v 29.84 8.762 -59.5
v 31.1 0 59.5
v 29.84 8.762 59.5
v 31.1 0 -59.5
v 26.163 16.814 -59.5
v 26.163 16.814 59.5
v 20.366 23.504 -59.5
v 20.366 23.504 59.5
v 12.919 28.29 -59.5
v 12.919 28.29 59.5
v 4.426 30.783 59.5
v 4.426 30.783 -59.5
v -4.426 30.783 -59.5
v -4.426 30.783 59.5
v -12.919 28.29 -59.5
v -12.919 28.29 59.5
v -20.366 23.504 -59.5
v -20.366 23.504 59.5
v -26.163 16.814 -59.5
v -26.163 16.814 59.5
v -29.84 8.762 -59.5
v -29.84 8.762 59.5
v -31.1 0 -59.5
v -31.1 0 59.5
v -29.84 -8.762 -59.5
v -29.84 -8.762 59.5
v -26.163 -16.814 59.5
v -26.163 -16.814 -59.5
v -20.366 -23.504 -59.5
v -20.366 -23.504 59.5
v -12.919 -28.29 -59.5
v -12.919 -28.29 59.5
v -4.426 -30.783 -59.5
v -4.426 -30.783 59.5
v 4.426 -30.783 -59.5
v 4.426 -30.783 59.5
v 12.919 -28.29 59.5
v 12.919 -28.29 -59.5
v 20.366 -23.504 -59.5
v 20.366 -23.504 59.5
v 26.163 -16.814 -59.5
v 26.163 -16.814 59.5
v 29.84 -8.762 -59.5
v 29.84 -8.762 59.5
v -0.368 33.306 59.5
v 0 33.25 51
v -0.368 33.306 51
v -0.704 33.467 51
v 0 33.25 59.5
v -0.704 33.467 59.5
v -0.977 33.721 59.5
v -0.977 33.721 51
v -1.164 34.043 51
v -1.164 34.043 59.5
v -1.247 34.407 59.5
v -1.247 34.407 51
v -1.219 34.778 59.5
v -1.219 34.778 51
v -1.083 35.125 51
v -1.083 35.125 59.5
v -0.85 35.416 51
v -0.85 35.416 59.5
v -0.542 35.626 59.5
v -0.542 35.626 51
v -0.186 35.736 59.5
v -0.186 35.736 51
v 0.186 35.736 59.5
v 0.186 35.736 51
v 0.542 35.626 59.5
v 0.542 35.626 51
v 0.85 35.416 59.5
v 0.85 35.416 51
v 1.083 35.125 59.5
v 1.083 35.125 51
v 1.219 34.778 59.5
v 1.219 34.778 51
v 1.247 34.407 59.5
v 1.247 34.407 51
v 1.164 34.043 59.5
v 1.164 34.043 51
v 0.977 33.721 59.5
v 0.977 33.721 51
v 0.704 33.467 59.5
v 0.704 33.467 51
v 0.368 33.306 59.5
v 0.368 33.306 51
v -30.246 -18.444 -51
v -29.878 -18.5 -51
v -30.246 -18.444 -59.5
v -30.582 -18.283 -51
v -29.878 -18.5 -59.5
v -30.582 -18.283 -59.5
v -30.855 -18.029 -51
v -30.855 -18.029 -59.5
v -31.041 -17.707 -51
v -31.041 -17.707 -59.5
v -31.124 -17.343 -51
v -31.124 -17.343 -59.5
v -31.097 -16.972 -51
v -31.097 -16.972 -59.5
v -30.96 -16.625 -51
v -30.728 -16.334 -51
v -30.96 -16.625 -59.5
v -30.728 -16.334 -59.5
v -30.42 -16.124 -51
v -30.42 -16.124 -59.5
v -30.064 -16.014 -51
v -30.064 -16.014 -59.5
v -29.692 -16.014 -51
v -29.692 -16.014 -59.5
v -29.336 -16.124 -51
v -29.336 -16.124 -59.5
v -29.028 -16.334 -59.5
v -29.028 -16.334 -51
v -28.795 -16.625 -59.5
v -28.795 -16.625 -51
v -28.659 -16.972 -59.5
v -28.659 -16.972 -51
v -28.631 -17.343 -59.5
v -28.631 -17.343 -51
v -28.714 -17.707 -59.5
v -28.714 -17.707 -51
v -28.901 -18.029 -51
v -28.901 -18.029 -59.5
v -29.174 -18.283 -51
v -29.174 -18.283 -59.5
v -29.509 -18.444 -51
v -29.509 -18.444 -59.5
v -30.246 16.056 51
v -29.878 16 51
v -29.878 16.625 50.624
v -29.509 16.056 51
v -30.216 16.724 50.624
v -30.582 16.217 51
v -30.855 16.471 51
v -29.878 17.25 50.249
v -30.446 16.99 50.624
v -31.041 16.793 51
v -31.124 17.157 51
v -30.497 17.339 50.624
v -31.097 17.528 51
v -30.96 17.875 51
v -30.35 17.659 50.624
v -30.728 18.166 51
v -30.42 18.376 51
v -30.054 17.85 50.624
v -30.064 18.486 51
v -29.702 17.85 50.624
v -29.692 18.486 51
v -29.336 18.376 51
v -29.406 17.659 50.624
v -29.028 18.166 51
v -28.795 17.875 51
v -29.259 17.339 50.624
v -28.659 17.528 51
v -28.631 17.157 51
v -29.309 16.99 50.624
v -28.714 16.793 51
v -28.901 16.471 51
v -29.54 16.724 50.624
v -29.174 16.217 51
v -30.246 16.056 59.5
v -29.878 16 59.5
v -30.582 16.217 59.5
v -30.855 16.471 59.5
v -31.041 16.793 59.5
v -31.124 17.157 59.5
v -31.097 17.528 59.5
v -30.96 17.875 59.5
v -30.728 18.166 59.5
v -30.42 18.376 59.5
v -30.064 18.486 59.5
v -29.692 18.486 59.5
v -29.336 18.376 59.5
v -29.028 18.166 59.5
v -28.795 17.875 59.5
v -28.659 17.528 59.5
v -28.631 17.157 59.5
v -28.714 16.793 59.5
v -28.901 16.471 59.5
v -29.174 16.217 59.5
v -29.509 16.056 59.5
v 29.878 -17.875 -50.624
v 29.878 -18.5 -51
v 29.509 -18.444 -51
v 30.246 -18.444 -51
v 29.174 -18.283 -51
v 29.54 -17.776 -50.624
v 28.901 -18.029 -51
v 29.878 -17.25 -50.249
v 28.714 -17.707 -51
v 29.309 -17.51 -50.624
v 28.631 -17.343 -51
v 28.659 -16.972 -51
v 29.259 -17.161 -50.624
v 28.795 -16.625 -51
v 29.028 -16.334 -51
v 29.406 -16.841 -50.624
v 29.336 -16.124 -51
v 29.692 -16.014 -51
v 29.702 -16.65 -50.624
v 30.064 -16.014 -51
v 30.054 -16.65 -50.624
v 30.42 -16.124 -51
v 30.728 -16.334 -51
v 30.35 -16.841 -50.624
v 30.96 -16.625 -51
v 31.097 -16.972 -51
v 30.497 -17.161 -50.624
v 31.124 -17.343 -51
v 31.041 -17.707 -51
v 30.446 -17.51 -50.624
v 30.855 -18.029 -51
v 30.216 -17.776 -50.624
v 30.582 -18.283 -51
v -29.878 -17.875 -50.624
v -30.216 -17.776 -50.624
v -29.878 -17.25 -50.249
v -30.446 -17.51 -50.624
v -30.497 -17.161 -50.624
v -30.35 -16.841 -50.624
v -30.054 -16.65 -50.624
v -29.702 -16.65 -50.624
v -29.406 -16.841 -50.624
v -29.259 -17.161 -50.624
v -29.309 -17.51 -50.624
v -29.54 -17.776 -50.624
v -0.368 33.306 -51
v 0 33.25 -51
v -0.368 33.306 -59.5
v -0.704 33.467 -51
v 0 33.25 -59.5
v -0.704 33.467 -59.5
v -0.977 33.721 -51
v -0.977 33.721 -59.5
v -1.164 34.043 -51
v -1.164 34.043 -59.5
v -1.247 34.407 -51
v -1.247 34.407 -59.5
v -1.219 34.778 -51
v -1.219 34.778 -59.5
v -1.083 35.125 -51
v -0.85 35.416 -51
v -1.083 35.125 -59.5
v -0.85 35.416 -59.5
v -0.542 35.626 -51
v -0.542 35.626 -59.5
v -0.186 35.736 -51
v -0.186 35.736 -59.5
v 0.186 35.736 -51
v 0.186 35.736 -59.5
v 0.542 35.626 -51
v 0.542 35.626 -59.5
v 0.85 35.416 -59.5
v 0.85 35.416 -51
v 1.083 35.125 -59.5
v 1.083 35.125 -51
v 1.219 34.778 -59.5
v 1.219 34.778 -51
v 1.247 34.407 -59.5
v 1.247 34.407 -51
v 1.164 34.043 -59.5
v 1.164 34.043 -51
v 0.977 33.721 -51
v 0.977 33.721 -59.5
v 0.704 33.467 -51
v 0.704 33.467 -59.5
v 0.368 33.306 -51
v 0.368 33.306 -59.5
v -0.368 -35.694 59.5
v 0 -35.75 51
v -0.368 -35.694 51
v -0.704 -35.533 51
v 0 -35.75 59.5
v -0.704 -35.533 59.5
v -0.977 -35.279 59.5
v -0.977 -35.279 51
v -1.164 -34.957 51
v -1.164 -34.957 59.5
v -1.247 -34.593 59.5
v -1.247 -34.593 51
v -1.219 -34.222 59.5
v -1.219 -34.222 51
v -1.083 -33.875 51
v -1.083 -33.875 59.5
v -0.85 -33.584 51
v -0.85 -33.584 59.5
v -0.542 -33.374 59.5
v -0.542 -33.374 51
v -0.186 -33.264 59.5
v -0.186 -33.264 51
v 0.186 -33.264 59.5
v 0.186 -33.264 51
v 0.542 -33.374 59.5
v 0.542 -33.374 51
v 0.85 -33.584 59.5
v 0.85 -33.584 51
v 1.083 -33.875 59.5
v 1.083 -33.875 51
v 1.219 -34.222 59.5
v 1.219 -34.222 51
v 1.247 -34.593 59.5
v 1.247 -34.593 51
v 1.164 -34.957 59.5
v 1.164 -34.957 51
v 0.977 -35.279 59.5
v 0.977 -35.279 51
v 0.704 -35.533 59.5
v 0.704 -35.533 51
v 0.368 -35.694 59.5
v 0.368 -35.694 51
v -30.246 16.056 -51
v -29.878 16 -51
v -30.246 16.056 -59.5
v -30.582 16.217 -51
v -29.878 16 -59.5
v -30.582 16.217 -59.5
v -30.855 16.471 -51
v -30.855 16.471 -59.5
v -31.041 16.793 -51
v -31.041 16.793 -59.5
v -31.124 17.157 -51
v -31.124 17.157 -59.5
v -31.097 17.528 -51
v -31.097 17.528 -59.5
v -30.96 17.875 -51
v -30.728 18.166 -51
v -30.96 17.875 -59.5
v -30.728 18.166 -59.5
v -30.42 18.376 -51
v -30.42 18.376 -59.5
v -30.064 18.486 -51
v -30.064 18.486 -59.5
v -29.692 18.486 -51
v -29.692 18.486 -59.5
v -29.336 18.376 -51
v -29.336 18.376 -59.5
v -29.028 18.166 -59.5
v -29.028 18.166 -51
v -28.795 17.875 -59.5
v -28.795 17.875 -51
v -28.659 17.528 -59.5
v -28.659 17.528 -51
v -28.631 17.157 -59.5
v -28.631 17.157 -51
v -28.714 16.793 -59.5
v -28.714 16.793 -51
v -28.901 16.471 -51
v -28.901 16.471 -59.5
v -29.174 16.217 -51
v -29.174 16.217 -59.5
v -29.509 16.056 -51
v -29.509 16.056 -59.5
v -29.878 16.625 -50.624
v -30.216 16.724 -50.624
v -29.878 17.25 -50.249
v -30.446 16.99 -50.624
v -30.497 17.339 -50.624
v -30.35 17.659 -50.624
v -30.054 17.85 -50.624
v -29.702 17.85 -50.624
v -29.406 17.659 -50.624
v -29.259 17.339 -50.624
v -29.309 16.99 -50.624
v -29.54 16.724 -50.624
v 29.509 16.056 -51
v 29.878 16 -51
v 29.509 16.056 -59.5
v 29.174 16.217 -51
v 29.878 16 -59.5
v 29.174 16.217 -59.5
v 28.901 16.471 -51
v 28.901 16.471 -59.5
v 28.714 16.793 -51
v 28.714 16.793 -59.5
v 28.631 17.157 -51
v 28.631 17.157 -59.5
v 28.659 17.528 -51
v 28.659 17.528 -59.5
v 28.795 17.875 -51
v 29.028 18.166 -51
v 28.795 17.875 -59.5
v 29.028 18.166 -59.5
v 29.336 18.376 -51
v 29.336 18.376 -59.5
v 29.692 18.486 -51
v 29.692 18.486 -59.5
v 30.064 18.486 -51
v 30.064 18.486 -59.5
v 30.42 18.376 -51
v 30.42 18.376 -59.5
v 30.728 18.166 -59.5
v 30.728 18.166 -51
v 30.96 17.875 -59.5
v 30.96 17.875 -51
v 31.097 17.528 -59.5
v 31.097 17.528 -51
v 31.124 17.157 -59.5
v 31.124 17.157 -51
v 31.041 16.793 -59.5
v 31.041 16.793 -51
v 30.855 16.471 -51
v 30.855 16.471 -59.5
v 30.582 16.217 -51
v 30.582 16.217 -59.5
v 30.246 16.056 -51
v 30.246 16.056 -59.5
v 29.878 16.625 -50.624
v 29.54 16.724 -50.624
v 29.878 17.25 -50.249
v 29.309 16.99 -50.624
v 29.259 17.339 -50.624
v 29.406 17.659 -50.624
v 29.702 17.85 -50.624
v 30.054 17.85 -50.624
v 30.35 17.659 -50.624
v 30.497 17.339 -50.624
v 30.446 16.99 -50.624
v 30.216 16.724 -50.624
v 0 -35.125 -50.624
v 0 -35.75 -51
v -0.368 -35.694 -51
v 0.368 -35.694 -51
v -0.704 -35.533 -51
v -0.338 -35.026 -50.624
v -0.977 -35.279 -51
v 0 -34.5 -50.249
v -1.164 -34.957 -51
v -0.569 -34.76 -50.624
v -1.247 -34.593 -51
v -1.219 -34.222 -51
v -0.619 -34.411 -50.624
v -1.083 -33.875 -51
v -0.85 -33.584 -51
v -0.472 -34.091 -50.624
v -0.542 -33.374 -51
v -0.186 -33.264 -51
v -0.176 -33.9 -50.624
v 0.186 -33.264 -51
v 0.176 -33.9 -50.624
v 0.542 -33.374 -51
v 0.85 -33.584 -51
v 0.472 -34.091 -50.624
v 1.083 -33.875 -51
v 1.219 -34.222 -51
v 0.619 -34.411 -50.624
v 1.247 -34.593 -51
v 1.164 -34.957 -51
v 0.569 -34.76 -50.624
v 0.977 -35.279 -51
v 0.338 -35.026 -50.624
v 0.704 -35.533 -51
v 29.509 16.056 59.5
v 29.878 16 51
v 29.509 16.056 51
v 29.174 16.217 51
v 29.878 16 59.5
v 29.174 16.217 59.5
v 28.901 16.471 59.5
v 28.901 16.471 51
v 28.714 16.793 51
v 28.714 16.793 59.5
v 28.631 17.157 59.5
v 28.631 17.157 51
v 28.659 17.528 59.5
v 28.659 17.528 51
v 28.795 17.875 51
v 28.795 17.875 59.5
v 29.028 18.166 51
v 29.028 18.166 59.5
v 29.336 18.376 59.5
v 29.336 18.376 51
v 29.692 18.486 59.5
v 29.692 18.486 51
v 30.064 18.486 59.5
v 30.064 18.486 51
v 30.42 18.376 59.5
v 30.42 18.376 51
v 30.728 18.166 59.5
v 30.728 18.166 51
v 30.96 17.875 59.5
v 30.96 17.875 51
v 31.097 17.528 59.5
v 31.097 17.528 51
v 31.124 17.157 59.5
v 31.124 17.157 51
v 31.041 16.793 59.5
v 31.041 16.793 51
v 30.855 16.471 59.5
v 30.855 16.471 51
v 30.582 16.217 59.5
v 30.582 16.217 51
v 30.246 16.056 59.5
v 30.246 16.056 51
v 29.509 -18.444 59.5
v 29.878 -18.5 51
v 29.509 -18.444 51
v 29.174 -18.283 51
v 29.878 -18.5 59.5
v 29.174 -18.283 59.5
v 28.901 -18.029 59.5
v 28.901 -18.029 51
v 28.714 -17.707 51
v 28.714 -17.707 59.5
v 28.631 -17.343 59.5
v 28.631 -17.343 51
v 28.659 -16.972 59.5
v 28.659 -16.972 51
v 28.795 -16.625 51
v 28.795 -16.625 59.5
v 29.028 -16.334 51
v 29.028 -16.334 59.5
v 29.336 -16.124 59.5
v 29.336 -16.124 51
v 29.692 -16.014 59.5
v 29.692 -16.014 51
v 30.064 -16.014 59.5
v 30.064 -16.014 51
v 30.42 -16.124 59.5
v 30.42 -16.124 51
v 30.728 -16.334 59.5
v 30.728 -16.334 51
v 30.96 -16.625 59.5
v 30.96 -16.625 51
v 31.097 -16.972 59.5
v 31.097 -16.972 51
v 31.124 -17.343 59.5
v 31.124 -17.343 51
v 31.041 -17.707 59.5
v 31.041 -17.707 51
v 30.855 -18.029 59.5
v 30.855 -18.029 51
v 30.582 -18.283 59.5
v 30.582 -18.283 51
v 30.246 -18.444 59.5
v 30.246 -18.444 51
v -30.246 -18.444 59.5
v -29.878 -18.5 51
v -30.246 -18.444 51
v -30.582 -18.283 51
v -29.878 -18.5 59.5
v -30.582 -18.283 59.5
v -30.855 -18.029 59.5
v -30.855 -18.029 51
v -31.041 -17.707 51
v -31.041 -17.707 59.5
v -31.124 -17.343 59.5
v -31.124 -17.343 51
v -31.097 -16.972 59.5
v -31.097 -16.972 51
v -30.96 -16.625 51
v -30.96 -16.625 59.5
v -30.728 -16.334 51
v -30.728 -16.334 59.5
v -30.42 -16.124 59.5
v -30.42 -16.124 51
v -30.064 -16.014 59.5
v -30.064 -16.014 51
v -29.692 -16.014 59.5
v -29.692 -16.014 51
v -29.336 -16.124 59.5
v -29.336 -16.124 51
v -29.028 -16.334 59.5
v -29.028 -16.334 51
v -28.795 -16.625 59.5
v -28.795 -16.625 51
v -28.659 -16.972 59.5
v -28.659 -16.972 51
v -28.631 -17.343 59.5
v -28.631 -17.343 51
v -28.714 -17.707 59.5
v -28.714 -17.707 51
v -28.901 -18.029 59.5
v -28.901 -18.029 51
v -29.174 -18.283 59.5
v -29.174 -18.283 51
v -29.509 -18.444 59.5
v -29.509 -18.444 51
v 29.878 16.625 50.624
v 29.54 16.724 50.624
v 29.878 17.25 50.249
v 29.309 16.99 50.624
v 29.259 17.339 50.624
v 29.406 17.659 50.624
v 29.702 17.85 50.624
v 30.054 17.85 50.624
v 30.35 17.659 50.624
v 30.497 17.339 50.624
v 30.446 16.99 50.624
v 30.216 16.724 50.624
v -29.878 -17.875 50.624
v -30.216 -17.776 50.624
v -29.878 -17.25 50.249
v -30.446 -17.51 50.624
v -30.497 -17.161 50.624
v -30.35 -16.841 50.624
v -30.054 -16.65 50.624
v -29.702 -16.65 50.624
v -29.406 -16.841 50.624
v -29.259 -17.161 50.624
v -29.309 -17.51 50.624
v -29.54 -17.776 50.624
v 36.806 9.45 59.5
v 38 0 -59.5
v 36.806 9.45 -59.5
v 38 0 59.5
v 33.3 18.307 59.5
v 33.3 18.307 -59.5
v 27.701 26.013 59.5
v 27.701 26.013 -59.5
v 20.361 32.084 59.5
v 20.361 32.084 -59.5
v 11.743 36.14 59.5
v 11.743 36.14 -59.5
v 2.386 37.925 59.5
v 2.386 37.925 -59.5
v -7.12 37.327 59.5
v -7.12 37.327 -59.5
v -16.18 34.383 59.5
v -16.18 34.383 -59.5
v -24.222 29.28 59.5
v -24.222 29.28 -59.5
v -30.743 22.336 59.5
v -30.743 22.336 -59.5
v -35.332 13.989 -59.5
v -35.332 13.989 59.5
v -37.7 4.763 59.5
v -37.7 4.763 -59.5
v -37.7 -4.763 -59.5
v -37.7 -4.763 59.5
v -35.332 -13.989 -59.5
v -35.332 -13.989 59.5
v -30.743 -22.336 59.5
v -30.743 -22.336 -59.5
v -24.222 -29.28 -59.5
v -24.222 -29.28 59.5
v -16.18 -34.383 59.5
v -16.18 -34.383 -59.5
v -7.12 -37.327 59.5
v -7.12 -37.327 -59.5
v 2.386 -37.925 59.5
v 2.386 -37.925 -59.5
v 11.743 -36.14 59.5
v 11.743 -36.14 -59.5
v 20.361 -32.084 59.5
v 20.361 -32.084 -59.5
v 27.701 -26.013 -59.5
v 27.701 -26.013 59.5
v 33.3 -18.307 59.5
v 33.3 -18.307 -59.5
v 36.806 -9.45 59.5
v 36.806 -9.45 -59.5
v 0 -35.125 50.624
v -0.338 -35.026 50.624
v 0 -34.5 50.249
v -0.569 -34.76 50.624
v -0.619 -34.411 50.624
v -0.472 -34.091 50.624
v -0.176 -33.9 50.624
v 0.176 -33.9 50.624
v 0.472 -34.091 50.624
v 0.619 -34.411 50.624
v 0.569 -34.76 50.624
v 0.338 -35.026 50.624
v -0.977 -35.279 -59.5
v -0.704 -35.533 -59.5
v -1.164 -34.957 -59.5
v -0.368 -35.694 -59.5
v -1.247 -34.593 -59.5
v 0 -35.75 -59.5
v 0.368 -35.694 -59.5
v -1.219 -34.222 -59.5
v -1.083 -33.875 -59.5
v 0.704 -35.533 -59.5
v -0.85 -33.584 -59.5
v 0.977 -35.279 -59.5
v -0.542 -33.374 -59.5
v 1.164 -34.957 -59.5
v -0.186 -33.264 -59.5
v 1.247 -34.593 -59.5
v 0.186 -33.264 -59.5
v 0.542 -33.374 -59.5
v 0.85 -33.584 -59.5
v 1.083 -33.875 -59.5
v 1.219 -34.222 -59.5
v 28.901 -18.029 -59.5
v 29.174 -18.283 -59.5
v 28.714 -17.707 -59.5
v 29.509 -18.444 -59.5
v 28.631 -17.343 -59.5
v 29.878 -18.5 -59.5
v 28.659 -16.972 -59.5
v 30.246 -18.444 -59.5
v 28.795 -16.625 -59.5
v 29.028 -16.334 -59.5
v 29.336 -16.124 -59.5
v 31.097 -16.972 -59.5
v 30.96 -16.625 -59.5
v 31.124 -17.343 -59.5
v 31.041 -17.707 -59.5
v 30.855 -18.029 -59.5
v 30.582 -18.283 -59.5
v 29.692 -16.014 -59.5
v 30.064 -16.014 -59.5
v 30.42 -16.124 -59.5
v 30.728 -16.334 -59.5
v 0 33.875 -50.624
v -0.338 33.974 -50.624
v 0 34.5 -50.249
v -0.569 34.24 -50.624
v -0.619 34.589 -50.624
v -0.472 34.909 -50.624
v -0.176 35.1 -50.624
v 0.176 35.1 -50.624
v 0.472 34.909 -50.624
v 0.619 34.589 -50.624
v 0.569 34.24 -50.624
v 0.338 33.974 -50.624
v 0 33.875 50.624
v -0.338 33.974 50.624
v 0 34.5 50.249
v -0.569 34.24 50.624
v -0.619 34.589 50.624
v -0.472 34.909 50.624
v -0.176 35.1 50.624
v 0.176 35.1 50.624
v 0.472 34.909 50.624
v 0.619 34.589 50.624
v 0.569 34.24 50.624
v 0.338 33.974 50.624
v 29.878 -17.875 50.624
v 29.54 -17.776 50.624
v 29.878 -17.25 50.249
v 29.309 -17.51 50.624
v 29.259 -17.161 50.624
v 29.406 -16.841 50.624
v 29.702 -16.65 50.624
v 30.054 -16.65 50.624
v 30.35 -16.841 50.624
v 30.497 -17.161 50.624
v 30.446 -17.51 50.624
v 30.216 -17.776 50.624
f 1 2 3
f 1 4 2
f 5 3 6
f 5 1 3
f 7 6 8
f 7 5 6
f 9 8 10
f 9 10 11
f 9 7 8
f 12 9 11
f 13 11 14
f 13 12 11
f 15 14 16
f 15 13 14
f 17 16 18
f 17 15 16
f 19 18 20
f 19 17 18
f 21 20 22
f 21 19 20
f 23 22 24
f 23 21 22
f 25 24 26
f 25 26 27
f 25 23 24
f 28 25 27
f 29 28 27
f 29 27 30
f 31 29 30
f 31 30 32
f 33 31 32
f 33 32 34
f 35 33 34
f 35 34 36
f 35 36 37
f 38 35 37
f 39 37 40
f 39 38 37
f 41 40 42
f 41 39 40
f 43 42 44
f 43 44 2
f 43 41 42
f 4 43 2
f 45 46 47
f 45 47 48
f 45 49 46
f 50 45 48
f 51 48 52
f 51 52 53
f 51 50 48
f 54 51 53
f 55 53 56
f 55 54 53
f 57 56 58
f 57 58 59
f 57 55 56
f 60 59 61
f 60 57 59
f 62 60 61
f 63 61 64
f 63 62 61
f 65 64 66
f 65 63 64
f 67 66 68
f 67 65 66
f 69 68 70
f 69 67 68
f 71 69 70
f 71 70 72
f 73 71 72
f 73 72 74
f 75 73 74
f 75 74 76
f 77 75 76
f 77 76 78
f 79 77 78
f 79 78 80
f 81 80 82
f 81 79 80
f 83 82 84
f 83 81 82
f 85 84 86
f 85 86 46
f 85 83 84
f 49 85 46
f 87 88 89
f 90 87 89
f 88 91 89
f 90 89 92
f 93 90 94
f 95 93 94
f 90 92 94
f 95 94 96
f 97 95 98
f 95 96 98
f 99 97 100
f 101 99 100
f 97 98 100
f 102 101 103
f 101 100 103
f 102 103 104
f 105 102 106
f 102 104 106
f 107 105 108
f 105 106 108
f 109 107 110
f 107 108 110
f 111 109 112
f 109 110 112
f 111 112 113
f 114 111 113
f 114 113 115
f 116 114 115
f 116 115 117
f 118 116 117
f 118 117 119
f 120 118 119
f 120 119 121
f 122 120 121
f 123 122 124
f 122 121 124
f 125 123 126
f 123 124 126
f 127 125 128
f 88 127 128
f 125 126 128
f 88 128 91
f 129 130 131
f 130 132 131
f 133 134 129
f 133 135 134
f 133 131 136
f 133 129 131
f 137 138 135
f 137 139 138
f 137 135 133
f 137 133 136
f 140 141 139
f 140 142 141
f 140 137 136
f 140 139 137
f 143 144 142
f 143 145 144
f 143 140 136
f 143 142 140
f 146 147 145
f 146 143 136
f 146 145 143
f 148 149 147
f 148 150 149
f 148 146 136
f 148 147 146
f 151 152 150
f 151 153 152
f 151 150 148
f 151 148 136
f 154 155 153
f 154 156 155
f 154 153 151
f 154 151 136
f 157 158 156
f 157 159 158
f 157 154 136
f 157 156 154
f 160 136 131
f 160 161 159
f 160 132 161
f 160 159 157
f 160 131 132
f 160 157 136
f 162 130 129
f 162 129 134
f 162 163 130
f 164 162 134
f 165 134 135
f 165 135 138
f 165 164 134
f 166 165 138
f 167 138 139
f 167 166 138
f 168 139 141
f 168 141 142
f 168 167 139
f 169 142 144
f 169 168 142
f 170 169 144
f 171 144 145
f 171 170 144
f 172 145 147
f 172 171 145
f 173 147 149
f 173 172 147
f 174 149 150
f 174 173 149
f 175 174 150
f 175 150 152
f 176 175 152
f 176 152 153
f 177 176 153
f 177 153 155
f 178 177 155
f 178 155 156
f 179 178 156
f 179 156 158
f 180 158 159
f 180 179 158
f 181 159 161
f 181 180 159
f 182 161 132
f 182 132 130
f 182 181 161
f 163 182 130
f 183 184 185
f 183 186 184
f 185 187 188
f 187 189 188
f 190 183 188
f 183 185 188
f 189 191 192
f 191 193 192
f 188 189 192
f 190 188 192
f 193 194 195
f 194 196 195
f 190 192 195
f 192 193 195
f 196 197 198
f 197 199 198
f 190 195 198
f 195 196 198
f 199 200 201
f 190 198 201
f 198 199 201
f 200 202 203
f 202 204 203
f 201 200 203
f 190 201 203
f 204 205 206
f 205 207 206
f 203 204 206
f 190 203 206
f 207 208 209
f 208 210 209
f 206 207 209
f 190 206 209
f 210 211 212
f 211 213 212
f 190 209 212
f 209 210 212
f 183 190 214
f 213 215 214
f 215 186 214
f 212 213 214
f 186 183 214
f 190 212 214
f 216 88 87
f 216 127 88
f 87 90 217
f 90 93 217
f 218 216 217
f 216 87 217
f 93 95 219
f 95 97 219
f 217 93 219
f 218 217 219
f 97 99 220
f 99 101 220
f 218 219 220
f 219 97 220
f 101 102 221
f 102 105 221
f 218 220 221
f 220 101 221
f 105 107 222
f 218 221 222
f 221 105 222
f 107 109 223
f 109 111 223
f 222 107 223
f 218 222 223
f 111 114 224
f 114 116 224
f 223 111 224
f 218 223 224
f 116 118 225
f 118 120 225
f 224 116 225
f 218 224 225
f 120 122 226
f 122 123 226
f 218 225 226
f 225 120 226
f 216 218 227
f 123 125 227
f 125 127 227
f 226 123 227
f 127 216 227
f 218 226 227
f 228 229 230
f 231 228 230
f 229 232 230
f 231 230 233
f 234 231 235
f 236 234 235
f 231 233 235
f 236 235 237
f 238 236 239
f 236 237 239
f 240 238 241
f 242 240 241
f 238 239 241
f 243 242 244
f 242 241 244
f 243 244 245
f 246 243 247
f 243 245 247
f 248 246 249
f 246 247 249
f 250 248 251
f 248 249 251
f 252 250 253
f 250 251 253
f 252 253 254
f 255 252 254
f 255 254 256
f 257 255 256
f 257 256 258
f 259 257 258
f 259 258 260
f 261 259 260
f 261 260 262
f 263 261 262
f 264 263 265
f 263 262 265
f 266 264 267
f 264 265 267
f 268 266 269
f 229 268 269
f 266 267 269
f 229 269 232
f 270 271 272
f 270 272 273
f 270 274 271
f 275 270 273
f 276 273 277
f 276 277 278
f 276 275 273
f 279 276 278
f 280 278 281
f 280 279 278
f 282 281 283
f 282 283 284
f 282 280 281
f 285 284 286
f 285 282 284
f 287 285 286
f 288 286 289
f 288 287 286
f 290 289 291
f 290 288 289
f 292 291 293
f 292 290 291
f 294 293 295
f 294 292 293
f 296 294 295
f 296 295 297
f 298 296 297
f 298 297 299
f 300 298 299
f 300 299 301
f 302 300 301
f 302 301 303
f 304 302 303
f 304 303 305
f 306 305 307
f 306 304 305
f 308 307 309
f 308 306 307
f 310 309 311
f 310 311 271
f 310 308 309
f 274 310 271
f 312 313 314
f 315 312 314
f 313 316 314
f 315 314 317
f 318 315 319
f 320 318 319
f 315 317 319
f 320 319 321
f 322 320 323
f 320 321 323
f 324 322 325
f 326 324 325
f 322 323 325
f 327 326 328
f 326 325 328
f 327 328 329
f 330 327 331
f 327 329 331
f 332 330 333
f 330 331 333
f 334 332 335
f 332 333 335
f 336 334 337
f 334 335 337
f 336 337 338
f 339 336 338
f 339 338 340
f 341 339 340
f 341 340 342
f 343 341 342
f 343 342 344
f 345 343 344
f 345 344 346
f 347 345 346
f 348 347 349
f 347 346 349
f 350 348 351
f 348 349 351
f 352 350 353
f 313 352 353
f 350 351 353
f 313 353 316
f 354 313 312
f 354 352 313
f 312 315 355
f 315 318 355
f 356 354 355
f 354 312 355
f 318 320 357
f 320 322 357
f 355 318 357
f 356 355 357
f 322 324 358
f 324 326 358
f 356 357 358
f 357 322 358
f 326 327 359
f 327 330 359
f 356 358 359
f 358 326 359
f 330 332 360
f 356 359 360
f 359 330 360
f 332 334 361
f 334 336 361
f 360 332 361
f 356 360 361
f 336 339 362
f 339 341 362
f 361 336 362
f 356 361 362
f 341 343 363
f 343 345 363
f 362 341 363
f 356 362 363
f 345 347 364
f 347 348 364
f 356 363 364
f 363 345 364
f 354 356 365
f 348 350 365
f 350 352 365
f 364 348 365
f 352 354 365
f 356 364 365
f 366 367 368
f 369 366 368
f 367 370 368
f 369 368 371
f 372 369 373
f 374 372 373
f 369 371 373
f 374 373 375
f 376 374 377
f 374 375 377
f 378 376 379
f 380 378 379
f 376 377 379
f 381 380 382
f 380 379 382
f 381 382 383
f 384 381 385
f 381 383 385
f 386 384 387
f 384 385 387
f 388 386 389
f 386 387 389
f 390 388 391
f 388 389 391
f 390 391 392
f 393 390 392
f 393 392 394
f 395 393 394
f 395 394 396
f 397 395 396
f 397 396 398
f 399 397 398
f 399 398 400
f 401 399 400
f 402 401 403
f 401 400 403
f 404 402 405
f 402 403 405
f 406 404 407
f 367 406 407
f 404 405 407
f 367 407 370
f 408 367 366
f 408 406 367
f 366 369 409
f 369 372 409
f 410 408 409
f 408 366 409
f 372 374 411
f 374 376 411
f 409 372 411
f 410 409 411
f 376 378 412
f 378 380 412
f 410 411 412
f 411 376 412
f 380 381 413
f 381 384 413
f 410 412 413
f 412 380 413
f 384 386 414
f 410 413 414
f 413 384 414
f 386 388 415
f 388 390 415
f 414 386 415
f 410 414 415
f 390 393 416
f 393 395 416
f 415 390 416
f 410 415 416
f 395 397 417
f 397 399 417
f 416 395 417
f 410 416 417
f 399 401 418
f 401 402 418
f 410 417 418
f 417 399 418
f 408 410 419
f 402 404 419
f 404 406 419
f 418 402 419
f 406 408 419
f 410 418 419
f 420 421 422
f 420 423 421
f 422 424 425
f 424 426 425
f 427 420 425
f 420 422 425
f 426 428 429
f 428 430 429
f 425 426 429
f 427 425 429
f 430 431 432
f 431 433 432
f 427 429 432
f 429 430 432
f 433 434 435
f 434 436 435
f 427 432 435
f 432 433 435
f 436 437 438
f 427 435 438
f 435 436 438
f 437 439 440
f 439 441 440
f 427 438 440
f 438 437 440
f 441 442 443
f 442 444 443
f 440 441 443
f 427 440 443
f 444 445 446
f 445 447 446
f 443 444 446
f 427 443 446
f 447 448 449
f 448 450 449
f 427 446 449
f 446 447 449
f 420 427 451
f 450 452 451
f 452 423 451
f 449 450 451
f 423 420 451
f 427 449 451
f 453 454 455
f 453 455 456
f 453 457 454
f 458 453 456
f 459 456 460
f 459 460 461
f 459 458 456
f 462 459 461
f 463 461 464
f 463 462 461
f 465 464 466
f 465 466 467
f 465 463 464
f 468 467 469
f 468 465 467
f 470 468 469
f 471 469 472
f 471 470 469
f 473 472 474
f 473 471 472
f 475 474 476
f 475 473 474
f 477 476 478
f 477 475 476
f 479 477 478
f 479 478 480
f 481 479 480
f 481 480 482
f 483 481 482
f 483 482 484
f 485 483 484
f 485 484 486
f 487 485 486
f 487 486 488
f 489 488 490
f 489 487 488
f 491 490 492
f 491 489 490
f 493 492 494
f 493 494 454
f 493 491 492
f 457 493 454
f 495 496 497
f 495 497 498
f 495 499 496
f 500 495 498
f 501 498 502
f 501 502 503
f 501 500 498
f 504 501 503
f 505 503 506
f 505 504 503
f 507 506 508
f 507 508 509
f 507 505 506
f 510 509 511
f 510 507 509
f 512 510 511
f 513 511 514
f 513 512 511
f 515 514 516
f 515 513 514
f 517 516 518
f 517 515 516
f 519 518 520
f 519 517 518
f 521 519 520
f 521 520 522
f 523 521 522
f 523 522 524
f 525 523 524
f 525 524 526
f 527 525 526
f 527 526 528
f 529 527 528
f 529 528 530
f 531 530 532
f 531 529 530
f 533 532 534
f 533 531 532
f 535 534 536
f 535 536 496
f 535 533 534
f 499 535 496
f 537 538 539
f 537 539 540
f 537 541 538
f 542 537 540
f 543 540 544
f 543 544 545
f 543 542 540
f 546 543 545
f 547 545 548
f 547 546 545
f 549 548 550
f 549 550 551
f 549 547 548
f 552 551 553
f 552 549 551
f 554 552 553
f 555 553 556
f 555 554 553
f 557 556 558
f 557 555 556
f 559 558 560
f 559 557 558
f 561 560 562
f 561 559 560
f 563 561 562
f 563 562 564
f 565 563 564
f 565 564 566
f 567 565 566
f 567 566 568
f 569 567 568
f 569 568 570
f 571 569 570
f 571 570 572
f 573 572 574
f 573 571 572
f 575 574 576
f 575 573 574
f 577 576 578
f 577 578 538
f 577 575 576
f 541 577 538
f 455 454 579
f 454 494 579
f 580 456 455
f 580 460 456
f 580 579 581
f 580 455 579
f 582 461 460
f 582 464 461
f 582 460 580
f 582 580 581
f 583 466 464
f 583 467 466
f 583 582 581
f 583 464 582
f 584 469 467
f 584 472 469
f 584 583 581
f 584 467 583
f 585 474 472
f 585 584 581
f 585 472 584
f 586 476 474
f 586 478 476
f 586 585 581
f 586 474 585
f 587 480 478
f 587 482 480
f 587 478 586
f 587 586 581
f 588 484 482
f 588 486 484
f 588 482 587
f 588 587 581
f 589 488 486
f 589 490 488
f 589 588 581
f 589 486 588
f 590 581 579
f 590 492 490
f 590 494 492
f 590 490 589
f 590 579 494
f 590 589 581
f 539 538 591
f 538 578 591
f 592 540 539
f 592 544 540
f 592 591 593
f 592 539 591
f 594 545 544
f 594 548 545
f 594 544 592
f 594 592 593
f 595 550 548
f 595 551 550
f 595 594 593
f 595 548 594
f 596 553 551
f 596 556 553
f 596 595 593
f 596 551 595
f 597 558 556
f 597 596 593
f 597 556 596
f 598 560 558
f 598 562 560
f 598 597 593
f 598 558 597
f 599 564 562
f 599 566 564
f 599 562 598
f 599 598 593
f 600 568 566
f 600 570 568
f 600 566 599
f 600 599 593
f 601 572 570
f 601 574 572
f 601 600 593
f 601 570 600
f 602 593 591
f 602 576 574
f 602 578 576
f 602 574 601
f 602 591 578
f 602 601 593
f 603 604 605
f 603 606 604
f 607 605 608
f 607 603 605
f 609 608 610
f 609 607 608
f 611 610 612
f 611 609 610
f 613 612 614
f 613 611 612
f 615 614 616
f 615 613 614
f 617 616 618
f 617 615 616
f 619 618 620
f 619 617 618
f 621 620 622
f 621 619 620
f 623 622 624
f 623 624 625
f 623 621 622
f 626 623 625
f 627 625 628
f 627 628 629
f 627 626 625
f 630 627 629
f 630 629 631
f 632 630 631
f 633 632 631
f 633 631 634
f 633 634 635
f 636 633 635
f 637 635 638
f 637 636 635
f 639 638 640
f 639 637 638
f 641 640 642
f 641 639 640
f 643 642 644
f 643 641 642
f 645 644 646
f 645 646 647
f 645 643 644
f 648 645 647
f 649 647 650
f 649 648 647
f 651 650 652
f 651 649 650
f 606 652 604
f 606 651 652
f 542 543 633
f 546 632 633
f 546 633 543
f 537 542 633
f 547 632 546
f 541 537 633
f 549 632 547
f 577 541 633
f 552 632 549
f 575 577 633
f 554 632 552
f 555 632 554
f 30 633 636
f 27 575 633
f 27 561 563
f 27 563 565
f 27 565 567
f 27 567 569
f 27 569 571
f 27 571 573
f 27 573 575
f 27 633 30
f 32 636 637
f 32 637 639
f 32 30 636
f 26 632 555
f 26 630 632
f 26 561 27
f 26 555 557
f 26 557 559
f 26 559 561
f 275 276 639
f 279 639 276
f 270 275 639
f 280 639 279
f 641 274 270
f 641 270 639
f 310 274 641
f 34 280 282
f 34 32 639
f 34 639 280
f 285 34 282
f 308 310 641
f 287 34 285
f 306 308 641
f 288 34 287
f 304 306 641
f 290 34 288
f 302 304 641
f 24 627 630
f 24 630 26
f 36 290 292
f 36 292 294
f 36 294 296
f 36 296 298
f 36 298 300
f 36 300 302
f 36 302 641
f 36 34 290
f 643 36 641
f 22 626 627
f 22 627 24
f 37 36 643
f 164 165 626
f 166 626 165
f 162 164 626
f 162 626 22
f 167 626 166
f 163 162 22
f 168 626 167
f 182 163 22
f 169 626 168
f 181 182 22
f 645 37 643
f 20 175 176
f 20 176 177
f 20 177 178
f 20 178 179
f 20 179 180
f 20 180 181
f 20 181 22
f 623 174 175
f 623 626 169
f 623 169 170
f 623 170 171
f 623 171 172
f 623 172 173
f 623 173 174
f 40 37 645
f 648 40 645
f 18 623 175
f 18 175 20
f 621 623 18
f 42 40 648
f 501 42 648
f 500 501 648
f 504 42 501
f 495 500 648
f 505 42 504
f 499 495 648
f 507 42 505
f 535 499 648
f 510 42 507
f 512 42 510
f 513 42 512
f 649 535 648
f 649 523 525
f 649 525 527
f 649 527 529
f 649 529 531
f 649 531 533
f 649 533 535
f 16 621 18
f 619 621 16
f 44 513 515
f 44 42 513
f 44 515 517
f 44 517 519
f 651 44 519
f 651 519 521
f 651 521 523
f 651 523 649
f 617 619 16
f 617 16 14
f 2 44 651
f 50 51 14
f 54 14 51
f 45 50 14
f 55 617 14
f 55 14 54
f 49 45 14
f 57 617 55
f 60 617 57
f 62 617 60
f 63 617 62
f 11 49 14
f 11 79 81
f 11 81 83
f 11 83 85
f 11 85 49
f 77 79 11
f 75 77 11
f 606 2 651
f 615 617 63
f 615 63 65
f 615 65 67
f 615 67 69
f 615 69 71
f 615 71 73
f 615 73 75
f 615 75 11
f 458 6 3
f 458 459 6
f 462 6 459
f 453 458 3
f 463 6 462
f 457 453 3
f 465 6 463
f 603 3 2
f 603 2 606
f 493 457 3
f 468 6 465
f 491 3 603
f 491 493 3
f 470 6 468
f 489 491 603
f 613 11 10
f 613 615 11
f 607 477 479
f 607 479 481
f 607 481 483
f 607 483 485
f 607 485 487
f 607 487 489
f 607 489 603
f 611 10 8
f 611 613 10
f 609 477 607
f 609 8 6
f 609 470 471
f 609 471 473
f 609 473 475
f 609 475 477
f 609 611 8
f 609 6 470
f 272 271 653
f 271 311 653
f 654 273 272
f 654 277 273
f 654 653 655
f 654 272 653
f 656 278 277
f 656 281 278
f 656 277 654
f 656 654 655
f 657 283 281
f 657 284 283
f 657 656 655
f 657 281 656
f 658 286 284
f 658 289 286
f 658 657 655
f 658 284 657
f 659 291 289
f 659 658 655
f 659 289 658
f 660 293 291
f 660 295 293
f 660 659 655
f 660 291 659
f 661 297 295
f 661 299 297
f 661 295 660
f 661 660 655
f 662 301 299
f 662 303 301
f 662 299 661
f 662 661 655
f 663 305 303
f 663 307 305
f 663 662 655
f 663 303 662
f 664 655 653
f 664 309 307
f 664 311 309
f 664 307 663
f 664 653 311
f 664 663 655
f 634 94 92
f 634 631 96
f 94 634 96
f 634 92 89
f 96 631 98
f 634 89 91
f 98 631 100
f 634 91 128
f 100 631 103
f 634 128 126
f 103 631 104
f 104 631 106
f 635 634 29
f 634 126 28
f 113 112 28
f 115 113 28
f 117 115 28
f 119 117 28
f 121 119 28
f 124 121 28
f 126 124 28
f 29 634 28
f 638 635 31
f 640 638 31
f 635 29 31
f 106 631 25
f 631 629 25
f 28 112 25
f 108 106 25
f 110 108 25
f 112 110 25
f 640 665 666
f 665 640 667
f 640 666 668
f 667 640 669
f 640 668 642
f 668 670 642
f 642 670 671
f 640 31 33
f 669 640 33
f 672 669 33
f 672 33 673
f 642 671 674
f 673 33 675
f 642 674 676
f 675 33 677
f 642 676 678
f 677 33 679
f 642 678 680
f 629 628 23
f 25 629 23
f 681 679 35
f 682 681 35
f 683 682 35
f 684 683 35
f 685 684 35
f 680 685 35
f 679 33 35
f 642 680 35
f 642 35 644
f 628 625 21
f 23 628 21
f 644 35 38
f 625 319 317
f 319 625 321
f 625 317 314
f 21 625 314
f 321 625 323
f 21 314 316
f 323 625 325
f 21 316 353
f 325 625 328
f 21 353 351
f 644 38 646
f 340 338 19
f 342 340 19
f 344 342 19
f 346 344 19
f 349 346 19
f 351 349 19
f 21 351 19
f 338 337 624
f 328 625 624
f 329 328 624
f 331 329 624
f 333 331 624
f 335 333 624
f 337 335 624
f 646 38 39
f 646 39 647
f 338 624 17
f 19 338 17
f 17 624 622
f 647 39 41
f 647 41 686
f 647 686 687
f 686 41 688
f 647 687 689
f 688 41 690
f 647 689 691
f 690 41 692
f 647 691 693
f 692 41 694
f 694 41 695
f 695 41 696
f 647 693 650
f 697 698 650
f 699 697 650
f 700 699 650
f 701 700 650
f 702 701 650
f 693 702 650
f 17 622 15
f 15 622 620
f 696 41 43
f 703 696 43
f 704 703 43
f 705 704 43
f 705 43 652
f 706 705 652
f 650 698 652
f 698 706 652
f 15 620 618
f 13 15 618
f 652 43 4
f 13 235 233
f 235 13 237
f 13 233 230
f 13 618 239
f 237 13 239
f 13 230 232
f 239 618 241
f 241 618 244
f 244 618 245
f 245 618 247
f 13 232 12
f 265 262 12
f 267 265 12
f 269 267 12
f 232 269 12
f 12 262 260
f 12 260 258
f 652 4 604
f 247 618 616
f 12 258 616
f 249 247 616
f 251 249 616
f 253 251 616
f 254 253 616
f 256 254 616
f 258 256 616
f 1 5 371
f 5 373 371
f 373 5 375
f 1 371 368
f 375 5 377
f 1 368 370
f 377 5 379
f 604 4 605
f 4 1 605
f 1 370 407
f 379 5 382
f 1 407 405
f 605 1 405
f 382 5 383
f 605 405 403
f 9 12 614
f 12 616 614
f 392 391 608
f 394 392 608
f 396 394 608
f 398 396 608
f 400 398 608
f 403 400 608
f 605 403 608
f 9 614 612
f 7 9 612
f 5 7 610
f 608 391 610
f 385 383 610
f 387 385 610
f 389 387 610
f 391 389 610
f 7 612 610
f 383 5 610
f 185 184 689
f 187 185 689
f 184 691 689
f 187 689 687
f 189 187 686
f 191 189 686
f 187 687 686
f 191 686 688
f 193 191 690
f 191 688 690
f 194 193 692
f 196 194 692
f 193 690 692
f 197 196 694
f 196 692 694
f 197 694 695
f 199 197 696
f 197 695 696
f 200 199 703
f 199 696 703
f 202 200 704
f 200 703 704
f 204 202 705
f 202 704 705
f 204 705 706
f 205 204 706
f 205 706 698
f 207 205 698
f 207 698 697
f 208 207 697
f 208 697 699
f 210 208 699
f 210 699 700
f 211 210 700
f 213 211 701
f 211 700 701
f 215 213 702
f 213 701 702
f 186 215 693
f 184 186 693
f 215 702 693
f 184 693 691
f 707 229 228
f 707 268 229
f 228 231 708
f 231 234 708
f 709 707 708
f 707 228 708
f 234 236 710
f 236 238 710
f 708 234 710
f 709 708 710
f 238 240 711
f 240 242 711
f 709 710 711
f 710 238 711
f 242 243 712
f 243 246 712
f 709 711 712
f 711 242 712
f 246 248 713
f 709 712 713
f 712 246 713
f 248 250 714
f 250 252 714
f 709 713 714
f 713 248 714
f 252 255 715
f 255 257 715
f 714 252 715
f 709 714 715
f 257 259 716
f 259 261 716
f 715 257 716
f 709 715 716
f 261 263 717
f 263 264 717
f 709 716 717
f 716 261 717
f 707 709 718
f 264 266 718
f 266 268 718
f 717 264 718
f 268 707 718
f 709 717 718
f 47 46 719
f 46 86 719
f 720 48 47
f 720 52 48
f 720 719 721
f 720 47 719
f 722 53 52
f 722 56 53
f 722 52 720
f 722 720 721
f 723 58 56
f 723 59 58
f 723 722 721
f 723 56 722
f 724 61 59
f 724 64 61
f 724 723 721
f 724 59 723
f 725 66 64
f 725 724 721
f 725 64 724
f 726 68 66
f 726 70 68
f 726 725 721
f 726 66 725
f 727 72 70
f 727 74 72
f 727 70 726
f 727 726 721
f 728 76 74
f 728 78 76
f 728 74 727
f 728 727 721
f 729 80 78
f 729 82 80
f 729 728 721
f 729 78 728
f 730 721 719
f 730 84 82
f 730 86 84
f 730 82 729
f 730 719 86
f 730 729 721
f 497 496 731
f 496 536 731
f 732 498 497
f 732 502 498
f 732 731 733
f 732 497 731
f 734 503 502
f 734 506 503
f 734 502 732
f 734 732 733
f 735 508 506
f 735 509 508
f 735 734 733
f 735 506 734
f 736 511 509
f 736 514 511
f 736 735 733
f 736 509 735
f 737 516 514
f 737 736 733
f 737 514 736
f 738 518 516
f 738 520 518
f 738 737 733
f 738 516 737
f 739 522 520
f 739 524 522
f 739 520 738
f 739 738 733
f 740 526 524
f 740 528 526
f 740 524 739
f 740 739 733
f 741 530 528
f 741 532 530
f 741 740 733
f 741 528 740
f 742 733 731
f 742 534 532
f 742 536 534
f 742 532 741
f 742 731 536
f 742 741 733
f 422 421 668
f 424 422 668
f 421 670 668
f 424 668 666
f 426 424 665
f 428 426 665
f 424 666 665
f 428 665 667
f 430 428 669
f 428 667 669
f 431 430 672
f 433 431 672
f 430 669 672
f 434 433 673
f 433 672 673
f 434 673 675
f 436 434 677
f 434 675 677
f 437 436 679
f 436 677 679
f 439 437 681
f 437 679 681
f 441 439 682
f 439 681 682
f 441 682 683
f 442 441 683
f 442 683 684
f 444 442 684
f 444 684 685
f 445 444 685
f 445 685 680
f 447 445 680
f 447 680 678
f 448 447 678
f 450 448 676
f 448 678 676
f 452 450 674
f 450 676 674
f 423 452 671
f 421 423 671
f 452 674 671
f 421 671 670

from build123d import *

# Parameters (mm, degrees)
SKETCH_1_R                  = 38
SKETCH_1_R_2                = 31.1
EXTRUDE_1_DEPTH             = 59.5
HOLE_WIZARD_M3_1_AT_2_COUNT = 2
HOLE_WIZARD_M3_1_AT_2_PITCH = 34.5
HOLE_WIZARD_M3_1_AT_3_COUNT = 2
HOLE_WIZARD_M3_1_AT_3_PITCH = 59.755752861
HOLE_WIZARD_M3_1_AT_4_COUNT = 2
HOLE_WIZARD_M3_1_AT_4_PITCH = 69
HOLE_WIZARD_M3_1_AT_5_COUNT = 2
HOLE_WIZARD_M3_1_AT_5_PITCH = 59.755752861
HOLE_WIZARD_M3_1_AT_6_COUNT = 2
HOLE_WIZARD_M3_1_AT_6_PITCH = 34.5


with BuildPart() as part:
    # 草图1 → 凸台-拉伸1 (new, symmetric)
    with BuildSketch(Plane.XY):
        Circle(SKETCH_1_R)
        Circle(SKETCH_1_R_2, mode=Mode.SUBTRACT)
    extrude(amount=EXTRUDE_1_DEPTH, both=True)

    # 草图2 → M3 螺纹孔1 (revolve, cut)
    with BuildSketch(Plane(origin=(0, 34.5, 59.5), x_dir=(0, -1, 0), z_dir=(1, 0, 0))):
        Polygon((0, 0), (0, 9.251075774), (1.25, 8.5), (1.25, 0), align=None)
    hole_wizard_m3_1 = revolve(axis=Axis((0, 34.5, 65.85), (0, 0, -1)), mode=Mode.SUBTRACT)

    # M3 螺纹孔1 at 2: M3 螺纹孔1 ×2
    with Locations(*[Vector(0.8660254037844671, -0.49999999999995076, 0) * (i * HOLE_WIZARD_M3_1_AT_2_PITCH) for i in range(1, HOLE_WIZARD_M3_1_AT_2_COUNT)]):
        add(hole_wizard_m3_1, mode=Mode.SUBTRACT)

    # M3 螺纹孔1 at 3: M3 螺纹孔1 ×2
    with Locations(*[Vector(0.5000000000000492, -0.8660254037844103, 0) * (i * HOLE_WIZARD_M3_1_AT_3_PITCH) for i in range(1, HOLE_WIZARD_M3_1_AT_3_COUNT)]):
        add(hole_wizard_m3_1, mode=Mode.SUBTRACT)

    # M3 螺纹孔1 at 4: M3 螺纹孔1 ×2
    with Locations(*[(0, -i * HOLE_WIZARD_M3_1_AT_4_PITCH, 0) for i in range(1, HOLE_WIZARD_M3_1_AT_4_COUNT)]):
        add(hole_wizard_m3_1, mode=Mode.SUBTRACT)

    # M3 螺纹孔1 at 5: M3 螺纹孔1 ×2
    with Locations(*[Vector(-0.49999999999995076, -0.866025403784467, 0) * (i * HOLE_WIZARD_M3_1_AT_5_PITCH) for i in range(1, HOLE_WIZARD_M3_1_AT_5_COUNT)]):
        add(hole_wizard_m3_1, mode=Mode.SUBTRACT)

    # M3 螺纹孔1 at 6: M3 螺纹孔1 ×2
    with Locations(*[Vector(-0.8660254037844105, -0.5000000000000487, 0) * (i * HOLE_WIZARD_M3_1_AT_6_PITCH) for i in range(1, HOLE_WIZARD_M3_1_AT_6_COUNT)]):
        add(hole_wizard_m3_1, mode=Mode.SUBTRACT)

    # 镜向1: M3 螺纹孔1 across plane
    add(hole_wizard_m3_1.mirror(Plane.XY), mode=Mode.SUBTRACT)

    # 镜向1 copy 1 sketch → 镜向1 copy 1 (revolve, cut)
    with BuildSketch(Plane(origin=(29.877876431, 17.25, -59.5), x_dir=(0, -1, 0), z_dir=(1, 0, 0))):
        Polygon((0, 0), (0, -9.251075774), (1.25, -8.5), (1.25, 0), align=None)
    revolve(axis=Axis((29.877876431, 17.25, -65.85), (0, 0, -1)), mode=Mode.SUBTRACT)

    # 镜向1 copy 2 sketch → 镜向1 copy 2 (revolve, cut)
    with BuildSketch(Plane(origin=(29.877876431, -17.25, -59.5), x_dir=(0, -1, 0), z_dir=(1, 0, 0))):
        Polygon((0, 0), (0, -9.251075774), (1.25, -8.5), (1.25, 0), align=None)
    revolve(axis=Axis((29.877876431, -17.25, -65.85), (0, 0, -1)), mode=Mode.SUBTRACT)

    # 镜向1 copy 3 sketch → 镜向1 copy 3 (revolve, cut)
    with BuildSketch(Plane(origin=(0, -34.5, -59.5), x_dir=(0, -1, 0), z_dir=(1, 0, 0))):
        Polygon((0, 0), (0, -9.251075774), (1.25, -8.5), (1.25, 0), align=None)
    revolve(axis=Axis((0, -34.5, -65.85), (0, 0, -1)), mode=Mode.SUBTRACT)

    # 镜向1 copy 4 sketch → 镜向1 copy 4 (revolve, cut)
    with BuildSketch(Plane(origin=(-29.877876431, -17.25, -59.5), x_dir=(0, -1, 0), z_dir=(1, 0, 0))):
        Polygon((0, 0), (0, -9.251075774), (1.25, -8.5), (1.25, 0), align=None)
    revolve(axis=Axis((-29.877876431, -17.25, -65.85), (0, 0, -1)), mode=Mode.SUBTRACT)

    # 镜向1 copy 5 sketch → 镜向1 copy 5 (revolve, cut)
    with BuildSketch(Plane(origin=(-29.877876431, 17.25, -59.5), x_dir=(0, -1, 0), z_dir=(1, 0, 0))):
        Polygon((0, 0), (0, -9.251075774), (1.25, -8.5), (1.25, 0), align=None)
    revolve(axis=Axis((-29.877876431, 17.25, -65.85), (0, 0, -1)), mode=Mode.SUBTRACT)


solid = part.part
